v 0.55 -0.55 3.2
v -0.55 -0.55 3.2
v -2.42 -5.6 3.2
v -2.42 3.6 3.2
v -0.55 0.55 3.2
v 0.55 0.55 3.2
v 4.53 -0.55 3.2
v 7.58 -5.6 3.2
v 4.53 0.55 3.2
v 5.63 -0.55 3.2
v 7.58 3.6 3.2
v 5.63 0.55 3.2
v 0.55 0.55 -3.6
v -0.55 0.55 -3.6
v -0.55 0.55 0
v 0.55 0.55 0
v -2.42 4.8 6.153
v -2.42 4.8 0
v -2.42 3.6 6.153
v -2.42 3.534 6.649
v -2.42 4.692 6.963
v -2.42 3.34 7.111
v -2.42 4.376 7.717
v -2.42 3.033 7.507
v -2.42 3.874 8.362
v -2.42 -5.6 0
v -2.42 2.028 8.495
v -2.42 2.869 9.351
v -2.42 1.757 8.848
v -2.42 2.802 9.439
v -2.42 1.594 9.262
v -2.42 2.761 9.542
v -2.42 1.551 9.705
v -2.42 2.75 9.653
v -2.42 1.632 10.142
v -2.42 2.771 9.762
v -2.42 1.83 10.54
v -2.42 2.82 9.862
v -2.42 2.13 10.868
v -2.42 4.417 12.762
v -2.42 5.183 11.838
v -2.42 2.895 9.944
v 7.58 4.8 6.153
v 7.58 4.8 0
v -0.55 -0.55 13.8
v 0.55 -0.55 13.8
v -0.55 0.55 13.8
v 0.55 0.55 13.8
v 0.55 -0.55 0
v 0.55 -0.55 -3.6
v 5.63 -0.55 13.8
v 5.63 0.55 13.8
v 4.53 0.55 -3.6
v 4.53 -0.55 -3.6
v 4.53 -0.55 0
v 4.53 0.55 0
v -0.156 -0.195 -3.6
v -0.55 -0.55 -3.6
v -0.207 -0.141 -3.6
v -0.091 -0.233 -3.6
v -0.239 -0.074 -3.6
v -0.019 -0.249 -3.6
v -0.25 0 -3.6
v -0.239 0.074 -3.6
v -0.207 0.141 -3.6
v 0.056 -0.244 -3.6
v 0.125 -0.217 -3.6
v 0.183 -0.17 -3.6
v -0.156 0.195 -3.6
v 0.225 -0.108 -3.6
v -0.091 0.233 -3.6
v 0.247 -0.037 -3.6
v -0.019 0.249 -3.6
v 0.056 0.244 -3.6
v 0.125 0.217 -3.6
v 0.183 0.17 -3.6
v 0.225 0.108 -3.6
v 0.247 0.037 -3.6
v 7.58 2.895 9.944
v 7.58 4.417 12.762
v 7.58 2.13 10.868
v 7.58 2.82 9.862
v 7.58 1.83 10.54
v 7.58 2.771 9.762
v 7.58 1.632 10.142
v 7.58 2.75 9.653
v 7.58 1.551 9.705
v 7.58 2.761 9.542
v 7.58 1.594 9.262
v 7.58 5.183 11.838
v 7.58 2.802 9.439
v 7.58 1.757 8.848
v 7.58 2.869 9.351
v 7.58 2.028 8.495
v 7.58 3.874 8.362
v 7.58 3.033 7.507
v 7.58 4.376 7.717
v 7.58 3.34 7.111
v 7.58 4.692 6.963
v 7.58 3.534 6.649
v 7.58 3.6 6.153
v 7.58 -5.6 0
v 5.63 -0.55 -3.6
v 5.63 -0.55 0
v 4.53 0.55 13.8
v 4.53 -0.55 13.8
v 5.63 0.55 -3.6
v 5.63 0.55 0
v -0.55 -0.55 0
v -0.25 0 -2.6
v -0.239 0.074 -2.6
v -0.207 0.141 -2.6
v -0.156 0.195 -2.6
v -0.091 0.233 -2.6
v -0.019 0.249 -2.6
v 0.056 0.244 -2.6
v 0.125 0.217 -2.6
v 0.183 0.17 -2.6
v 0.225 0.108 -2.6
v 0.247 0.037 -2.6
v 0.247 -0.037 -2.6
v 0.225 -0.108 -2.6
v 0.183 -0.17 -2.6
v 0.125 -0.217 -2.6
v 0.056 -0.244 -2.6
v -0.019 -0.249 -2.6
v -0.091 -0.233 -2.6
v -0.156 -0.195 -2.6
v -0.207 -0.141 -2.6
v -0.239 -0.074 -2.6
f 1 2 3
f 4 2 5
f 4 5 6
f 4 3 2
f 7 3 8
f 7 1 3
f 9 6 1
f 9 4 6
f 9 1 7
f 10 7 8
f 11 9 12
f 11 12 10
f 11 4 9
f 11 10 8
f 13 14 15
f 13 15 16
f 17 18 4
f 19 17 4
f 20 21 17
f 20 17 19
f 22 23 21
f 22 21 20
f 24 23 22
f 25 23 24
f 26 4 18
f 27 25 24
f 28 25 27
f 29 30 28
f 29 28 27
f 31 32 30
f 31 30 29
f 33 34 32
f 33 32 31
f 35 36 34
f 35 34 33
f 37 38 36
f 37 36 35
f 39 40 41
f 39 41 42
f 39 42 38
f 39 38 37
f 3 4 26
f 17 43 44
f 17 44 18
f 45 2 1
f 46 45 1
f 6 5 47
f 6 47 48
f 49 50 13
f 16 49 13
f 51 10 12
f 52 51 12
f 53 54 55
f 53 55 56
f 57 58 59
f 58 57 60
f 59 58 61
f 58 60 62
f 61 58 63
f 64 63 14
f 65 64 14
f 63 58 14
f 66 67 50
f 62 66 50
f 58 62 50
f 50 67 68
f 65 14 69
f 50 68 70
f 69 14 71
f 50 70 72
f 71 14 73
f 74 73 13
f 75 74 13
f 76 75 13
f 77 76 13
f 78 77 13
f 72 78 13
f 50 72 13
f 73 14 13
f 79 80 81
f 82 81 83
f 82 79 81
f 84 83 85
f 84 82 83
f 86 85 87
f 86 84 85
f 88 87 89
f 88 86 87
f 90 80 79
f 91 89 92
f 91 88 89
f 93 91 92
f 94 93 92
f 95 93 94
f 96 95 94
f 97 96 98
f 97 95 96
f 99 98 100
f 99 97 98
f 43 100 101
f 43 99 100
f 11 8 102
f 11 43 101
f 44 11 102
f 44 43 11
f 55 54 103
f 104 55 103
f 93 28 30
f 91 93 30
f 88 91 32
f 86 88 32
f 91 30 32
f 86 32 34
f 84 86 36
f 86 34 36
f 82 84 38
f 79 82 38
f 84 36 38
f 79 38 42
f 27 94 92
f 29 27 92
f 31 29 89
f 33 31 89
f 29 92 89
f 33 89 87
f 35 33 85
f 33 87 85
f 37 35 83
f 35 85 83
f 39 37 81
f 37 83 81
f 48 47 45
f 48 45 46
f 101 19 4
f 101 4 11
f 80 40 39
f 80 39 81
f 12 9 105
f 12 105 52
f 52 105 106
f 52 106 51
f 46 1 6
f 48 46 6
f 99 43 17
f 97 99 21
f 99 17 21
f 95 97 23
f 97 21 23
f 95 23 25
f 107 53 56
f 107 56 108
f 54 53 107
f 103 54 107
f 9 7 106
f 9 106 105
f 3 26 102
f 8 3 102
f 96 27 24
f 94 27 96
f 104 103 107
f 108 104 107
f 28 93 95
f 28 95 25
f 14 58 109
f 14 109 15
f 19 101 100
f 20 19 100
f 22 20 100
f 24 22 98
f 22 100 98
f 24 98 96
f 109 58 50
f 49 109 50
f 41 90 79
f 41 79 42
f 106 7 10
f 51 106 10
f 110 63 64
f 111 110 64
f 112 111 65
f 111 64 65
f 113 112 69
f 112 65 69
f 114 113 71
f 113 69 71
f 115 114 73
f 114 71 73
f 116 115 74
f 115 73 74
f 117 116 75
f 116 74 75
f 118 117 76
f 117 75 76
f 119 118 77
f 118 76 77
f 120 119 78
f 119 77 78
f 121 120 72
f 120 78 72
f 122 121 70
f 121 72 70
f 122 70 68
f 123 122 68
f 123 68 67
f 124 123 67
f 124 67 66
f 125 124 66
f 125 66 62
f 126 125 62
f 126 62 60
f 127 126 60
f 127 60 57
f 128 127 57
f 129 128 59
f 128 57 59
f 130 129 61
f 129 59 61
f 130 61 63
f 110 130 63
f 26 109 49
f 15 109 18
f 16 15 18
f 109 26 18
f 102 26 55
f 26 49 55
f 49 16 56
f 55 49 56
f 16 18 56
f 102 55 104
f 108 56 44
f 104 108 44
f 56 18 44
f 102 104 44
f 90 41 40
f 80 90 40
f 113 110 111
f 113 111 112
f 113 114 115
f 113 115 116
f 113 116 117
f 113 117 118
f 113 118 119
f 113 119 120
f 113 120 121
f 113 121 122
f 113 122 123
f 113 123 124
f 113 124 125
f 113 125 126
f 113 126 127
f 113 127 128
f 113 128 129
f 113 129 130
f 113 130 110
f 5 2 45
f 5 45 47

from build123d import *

# Parameters (mm, degrees)
SKETCH_2_W           = 15
SKETCH_2_H           = 10.4
EXTRUDE_1_DEPTH      = 3.2
EXTRUDE_2_DEPTH      = 13.8
EXTRUDE_2_DEPTH_BACK = 3.6
SKETCH_3_W           = 1.1
SKETCH_3_H           = 1.1
SKETCH_5_W           = 15
SKETCH_5_H           = 1.2
SKETCH_6_W           = 19.881870093
SKETCH_6_H           = 13.435857504
CUT_EXTRUDE_1_DEPTH  = 5
SKETCH_7_R           = 0.25
CUT_EXTRUDE_2_DEPTH  = 1


with BuildPart() as part:
    # Эскиз2 → Вытянуть1 (new body)
    with BuildSketch(Plane.XY):
        with Locations((5.08, -0.4)):
            Rectangle(SKETCH_2_W, SKETCH_2_H)
    extrude(amount=EXTRUDE_1_DEPTH)

    # Эскиз3 → Вытянуть2 (add, two sides: drawn at the far end of the back side and taken through both)
    with BuildSketch(Plane.XY.offset(-EXTRUDE_2_DEPTH_BACK)):
        Rectangle(SKETCH_3_W, SKETCH_3_H)
        with Locations((5.08, 0)):
            Rectangle(SKETCH_3_W, SKETCH_3_H)
        with Locations((10.16, 0)):
            Rectangle(SKETCH_3_W, SKETCH_3_H)
    extrude(amount=EXTRUDE_2_DEPTH + EXTRUDE_2_DEPTH_BACK)

    # По траектории1: sweep along a path in Эскиз4
    with BuildLine(Plane.ZY.offset(2.42)) as sweep_1_path:
        Line((3.2, 4.2), (6.152565934, 4.2))
        ThreePointArc((6.152565934, 4.2), (7.118635036, 4.005799317), (7.934615114, 3.453368392))
        Line((7.934615114, 3.453368392), (8.923160693, 2.448652643))
        ThreePointArc((8.923160693, 2.448652643), (9.678881269, 2.150920668), (10.406297634, 2.512339193))
        Line((10.406297634, 2.512339193), (12.3, 4.8))
    # Эскиз5 → По траектории1 (sweep)
    with BuildSketch(Plane.XY.offset(3.2)):
        with Locations((5.08, 4.2)):
            Rectangle(SKETCH_5_W, SKETCH_5_H)
    sweep(path=sweep_1_path.line)

    # Эскиз6 → Вырез-Вытянуть1 (cut)
    with BuildSketch(Plane(origin=(12.58, 0, 0), x_dir=(0, 0, -1), z_dir=(1, 0, 0))):
        with Locations((-5.619839725, -0.208714258)):
            Rectangle(SKETCH_6_W, SKETCH_6_H)
    extrude(amount=-CUT_EXTRUDE_1_DEPTH, mode=Mode.SUBTRACT)

    # Эскиз7 → Вырез-Вытянуть2 (cut)
    with BuildSketch(Plane(origin=(0, 0, -3.6), x_dir=(-1, 0, 0), z_dir=(0, 0, -1))):
        Circle(SKETCH_7_R)
    extrude(amount=-CUT_EXTRUDE_2_DEPTH, mode=Mode.SUBTRACT)


solid = part.part
